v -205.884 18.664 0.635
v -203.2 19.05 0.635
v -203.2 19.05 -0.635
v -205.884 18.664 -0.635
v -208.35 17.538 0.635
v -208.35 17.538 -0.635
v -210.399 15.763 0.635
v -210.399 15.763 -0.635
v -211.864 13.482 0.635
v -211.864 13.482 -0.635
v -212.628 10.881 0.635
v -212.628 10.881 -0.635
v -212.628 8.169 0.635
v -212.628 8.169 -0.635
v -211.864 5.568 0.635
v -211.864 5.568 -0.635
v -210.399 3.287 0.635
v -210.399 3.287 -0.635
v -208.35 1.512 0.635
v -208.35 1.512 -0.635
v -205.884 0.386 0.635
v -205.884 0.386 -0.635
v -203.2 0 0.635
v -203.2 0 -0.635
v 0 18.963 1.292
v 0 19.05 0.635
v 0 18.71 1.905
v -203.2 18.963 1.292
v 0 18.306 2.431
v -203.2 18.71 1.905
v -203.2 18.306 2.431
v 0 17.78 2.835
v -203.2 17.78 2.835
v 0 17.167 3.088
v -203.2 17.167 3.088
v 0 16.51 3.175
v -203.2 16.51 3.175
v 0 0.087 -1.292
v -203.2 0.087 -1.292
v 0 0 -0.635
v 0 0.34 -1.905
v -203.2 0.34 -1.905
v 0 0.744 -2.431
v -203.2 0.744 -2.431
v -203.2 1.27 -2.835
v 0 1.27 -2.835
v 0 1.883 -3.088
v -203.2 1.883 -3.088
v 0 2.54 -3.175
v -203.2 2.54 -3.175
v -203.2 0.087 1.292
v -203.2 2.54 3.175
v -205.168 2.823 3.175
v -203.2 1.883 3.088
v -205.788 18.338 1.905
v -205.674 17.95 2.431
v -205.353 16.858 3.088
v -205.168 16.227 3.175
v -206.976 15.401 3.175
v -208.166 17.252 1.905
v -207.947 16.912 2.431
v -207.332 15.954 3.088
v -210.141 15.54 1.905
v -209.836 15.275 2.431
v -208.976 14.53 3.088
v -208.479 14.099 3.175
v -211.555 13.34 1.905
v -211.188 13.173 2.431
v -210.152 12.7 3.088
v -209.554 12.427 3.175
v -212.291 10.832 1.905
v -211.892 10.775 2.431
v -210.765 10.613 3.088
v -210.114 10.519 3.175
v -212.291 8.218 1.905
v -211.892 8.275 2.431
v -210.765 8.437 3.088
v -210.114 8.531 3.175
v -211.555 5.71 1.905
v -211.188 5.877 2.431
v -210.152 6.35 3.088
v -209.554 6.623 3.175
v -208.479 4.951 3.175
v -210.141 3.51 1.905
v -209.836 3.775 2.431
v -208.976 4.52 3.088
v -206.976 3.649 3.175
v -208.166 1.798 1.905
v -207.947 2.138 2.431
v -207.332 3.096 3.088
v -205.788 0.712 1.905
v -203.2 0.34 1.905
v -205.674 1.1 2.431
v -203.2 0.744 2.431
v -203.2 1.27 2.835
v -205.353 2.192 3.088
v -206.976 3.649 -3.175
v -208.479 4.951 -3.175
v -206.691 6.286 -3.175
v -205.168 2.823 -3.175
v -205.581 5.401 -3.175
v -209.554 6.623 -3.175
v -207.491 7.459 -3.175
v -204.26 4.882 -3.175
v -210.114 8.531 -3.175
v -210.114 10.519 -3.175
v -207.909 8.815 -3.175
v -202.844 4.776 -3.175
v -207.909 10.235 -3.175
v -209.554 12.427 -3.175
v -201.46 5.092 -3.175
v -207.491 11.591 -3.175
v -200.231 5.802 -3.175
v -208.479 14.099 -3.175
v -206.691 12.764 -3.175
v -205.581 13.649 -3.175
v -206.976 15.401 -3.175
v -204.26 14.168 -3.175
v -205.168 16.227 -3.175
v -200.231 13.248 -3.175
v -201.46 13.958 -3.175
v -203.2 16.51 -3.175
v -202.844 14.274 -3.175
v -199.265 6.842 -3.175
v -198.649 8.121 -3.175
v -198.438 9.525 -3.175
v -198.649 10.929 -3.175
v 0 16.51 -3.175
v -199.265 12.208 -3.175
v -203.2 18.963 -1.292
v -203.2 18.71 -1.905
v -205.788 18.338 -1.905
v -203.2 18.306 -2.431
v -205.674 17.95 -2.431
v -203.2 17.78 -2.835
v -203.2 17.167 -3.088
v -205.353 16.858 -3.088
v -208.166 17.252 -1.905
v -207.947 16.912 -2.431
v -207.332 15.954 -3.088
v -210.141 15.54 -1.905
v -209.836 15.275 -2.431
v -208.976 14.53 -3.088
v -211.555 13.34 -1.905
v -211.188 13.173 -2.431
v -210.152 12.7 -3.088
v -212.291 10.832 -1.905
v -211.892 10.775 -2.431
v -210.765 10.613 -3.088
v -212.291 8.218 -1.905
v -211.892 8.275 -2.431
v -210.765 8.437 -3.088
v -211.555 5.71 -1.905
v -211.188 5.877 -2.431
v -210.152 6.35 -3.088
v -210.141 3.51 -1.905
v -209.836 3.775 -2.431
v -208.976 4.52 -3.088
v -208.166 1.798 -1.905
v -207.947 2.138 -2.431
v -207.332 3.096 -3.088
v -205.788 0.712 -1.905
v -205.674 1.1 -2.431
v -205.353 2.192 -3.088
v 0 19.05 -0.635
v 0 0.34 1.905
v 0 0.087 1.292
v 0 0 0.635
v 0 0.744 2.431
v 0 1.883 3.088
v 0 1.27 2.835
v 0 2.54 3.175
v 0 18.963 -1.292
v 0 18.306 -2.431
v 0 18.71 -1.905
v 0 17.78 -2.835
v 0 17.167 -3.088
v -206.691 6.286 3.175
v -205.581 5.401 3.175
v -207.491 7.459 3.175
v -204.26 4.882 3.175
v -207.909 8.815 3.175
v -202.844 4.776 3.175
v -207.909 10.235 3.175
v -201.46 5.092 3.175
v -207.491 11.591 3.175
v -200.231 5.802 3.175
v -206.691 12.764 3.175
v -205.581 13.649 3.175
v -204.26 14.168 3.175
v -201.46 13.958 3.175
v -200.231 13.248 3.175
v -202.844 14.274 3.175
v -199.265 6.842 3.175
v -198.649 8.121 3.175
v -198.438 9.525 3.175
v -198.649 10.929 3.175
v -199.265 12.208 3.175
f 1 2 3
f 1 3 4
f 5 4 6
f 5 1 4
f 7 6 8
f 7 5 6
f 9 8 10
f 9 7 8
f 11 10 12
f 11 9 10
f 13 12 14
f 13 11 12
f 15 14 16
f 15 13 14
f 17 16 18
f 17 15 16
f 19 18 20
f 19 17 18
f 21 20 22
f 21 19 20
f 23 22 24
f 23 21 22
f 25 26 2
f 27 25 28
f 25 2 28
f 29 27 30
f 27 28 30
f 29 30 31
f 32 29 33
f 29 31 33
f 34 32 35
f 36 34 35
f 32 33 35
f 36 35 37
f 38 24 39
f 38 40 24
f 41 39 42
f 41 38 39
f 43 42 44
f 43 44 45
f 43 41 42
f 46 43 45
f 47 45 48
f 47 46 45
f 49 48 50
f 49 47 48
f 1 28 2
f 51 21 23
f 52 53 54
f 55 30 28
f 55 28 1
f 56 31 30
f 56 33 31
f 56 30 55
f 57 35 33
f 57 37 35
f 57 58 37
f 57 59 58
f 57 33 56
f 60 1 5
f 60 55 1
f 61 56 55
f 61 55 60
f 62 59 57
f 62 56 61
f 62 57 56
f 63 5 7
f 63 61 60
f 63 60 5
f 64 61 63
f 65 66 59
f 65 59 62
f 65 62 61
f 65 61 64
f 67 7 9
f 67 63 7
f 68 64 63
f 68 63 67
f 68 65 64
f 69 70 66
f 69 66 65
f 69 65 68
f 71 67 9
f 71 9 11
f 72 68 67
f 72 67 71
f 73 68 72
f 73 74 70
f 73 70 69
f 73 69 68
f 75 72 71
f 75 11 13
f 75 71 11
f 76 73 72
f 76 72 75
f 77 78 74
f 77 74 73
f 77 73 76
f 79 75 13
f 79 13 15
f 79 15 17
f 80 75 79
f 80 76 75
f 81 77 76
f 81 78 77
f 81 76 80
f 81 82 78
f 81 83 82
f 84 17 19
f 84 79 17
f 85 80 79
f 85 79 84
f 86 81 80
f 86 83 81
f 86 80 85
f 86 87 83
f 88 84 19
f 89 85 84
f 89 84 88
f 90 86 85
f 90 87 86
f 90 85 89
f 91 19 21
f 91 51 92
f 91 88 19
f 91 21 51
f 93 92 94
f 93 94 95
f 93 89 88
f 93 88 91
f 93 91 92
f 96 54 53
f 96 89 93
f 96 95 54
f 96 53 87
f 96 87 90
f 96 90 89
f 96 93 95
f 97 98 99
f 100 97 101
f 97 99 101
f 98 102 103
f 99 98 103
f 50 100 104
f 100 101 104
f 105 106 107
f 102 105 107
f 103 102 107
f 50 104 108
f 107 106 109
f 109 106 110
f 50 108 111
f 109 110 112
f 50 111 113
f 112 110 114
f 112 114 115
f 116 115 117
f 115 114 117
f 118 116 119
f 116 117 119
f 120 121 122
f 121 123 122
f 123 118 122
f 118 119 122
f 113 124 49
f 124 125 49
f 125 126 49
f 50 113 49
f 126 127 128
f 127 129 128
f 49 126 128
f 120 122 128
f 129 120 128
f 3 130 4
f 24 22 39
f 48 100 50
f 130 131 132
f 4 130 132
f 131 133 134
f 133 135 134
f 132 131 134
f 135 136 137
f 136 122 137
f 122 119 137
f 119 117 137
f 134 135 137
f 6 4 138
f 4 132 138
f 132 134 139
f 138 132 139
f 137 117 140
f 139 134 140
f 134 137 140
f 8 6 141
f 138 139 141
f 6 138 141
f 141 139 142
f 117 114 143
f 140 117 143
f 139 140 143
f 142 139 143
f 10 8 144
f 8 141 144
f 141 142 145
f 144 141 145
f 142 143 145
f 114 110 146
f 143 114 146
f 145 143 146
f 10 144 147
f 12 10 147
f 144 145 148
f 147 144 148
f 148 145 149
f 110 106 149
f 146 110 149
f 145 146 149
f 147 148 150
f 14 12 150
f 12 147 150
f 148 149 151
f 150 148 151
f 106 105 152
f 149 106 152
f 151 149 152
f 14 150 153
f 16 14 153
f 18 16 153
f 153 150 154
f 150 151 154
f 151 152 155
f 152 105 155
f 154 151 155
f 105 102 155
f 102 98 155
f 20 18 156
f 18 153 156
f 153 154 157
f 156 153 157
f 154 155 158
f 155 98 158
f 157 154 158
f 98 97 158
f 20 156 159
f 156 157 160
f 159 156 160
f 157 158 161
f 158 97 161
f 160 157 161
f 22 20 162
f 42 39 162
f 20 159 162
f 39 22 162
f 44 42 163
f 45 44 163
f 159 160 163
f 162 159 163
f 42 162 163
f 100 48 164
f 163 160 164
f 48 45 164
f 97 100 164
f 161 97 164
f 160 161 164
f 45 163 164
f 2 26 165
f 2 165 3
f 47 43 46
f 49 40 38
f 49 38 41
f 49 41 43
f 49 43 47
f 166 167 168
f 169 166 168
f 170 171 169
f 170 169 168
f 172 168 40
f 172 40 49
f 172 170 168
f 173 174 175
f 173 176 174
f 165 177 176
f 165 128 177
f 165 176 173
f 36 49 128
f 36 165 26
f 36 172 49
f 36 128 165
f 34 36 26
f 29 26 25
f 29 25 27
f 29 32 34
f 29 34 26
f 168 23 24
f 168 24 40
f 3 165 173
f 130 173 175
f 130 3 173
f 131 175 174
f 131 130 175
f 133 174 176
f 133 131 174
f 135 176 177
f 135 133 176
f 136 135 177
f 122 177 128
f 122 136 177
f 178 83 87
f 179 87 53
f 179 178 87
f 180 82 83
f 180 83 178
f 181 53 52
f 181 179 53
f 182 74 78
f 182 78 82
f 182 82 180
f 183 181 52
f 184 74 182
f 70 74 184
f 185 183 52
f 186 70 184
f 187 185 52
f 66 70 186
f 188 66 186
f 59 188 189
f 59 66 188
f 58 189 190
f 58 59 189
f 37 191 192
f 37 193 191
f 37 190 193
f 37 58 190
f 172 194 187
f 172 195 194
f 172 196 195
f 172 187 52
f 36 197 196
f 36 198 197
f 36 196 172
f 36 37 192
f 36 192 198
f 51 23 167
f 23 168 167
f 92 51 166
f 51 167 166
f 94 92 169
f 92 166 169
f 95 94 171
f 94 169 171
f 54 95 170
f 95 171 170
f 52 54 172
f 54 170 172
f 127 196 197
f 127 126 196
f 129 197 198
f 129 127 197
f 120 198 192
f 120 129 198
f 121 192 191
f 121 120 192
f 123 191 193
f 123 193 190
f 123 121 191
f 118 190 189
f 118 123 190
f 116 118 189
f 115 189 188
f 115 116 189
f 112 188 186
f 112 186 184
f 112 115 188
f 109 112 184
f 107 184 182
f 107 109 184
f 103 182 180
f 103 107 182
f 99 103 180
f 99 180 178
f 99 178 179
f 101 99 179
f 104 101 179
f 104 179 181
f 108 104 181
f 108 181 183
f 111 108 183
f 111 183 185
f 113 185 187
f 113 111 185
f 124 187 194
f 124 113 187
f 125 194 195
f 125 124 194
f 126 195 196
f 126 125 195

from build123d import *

# Parameters (mm, degrees)
F0_R     = 4.7625
F2_DEPTH = 3.175
F3_R     = 2.54


# Not quite as in the source:
# - a variable given as a bare number and used for a length is read in inches; the dataset says mm whatever the document's units were


with BuildPart() as f2:
    # F0 (on Top) → F2 (new body, symmetric)
    with BuildSketch(Plane.XY):
        with BuildLine():
            Line((-203.2, 0), (0, 0))
            Line((0, 0), (0, 19.05))
            Line((0, 19.05), (-203.2, 19.05))
            ThreePointArc((-203.2, 19.05), (-212.725, 9.525), (-203.2, 0))
        make_face()
        with Locations((-203.2, 9.525)):
            Circle(F0_R, mode=Mode.SUBTRACT)
    extrude(amount=F2_DEPTH, both=True)

    # F3
    f3_edges = [f2.edges().sort_by_distance(p)[0] for p in [
        (-101.6, 0, 3.175),
        (-101.6, 0, -3.175),
    ]]
    fillet(f3_edges, radius=F3_R)


solid = f2.part
